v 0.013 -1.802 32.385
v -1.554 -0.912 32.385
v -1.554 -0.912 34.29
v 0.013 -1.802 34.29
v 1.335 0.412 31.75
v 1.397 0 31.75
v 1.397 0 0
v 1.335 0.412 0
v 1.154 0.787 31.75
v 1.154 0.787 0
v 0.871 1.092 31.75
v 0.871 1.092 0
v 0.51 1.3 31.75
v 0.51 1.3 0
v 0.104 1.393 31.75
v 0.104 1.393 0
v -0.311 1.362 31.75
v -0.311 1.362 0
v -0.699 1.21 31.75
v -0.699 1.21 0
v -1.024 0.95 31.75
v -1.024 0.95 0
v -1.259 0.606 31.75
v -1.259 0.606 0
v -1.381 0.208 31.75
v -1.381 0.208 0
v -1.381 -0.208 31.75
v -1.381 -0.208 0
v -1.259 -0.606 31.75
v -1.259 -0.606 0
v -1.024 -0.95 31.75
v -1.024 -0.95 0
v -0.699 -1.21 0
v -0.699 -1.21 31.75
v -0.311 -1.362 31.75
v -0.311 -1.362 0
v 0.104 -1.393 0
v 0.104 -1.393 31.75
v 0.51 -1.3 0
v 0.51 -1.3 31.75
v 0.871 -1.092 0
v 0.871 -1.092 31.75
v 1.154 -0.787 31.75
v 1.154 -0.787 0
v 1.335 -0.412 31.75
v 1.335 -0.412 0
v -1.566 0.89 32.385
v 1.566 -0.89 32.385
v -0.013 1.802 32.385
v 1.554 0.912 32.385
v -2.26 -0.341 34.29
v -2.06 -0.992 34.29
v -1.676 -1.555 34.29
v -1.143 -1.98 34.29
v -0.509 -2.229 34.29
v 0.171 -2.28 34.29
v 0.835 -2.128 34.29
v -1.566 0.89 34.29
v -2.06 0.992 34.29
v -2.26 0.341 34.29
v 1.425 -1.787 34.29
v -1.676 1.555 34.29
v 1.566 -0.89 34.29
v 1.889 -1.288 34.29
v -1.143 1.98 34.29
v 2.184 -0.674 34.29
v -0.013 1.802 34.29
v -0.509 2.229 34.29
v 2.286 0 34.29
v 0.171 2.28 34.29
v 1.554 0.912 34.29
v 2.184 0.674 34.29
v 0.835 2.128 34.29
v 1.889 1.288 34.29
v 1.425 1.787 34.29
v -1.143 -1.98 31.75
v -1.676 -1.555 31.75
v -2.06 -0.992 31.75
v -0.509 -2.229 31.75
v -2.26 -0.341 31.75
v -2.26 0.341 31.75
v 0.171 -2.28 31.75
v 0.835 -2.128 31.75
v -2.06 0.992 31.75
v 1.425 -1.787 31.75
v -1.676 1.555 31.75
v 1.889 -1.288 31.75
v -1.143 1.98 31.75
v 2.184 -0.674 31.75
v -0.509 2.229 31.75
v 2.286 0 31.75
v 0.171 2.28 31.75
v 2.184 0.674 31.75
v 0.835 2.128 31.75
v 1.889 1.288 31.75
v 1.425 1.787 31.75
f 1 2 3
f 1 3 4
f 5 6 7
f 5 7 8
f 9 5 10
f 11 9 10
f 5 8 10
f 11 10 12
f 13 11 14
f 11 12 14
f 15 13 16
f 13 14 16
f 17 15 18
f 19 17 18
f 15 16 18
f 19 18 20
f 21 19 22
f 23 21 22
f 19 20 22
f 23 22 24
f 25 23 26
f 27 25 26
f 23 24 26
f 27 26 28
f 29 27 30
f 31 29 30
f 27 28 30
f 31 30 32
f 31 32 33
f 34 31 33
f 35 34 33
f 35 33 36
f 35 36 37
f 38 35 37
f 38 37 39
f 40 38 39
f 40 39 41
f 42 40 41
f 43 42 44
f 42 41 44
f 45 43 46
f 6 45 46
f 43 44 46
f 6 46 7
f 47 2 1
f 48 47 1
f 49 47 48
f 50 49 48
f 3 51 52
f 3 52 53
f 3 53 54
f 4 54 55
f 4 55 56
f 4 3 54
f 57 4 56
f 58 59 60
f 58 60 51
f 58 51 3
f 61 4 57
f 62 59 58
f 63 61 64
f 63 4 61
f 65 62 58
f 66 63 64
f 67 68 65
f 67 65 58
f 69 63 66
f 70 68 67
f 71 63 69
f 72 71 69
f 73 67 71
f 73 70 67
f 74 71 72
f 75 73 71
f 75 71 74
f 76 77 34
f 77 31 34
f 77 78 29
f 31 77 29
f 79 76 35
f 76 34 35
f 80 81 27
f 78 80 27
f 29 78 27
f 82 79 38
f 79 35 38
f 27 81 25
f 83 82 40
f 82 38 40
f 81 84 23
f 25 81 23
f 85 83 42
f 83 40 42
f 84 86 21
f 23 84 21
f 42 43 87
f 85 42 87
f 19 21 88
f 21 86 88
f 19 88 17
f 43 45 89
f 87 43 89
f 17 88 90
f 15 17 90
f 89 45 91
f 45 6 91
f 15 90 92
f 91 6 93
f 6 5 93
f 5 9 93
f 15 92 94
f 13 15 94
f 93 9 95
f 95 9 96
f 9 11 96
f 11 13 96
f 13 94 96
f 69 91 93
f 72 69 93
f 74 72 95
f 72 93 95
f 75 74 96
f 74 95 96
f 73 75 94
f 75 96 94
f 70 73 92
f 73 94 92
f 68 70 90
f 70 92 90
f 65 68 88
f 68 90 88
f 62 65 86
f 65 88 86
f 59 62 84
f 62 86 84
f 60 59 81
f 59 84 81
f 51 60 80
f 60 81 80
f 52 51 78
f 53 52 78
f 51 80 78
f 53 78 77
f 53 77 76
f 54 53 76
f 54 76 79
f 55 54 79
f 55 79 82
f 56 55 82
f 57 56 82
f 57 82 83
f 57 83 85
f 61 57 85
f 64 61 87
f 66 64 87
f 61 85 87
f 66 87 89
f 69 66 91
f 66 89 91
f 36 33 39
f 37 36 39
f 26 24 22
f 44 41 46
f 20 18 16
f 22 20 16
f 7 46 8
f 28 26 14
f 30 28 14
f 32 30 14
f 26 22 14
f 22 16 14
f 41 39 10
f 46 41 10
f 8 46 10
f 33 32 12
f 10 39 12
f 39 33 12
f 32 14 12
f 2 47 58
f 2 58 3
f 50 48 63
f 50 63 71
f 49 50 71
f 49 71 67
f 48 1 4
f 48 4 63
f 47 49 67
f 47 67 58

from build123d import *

# Parameters (mm, degrees)
SKETCH1_R           = 1.397
BOSS_EXTRUDE1_DEPTH = 31.75
SKETCH2_R           = 2.286
BOSS_EXTRUDE2_DEPTH = 2.54
CUT_EXTRUDE1_DEPTH  = 1.905


with BuildPart() as part:
    # Sketch1 → Boss-Extrude1 (new body)
    with BuildSketch(Plane.XY):
        Circle(SKETCH1_R)
    extrude(amount=BOSS_EXTRUDE1_DEPTH)

    # Sketch2 → Boss-Extrude2 (add)
    with BuildSketch(Plane.XY.offset(31.75)):
        Circle(SKETCH2_R)
    extrude(amount=BOSS_EXTRUDE2_DEPTH)

    # Sketch4 → Cut-Extrude1 (cut)
    with BuildSketch(Plane.XY.offset(34.29)):
        Polygon((1.566413347, -0.889919011), (1.553899145, 0.911594246), (-0.012514203, 1.801513257), (-1.566413347, 0.889919011), (-1.553899145, -0.911594246), (0.012514203, -1.801513257), align=None)
    extrude(amount=-CUT_EXTRUDE1_DEPTH, mode=Mode.SUBTRACT)


solid = part.part
